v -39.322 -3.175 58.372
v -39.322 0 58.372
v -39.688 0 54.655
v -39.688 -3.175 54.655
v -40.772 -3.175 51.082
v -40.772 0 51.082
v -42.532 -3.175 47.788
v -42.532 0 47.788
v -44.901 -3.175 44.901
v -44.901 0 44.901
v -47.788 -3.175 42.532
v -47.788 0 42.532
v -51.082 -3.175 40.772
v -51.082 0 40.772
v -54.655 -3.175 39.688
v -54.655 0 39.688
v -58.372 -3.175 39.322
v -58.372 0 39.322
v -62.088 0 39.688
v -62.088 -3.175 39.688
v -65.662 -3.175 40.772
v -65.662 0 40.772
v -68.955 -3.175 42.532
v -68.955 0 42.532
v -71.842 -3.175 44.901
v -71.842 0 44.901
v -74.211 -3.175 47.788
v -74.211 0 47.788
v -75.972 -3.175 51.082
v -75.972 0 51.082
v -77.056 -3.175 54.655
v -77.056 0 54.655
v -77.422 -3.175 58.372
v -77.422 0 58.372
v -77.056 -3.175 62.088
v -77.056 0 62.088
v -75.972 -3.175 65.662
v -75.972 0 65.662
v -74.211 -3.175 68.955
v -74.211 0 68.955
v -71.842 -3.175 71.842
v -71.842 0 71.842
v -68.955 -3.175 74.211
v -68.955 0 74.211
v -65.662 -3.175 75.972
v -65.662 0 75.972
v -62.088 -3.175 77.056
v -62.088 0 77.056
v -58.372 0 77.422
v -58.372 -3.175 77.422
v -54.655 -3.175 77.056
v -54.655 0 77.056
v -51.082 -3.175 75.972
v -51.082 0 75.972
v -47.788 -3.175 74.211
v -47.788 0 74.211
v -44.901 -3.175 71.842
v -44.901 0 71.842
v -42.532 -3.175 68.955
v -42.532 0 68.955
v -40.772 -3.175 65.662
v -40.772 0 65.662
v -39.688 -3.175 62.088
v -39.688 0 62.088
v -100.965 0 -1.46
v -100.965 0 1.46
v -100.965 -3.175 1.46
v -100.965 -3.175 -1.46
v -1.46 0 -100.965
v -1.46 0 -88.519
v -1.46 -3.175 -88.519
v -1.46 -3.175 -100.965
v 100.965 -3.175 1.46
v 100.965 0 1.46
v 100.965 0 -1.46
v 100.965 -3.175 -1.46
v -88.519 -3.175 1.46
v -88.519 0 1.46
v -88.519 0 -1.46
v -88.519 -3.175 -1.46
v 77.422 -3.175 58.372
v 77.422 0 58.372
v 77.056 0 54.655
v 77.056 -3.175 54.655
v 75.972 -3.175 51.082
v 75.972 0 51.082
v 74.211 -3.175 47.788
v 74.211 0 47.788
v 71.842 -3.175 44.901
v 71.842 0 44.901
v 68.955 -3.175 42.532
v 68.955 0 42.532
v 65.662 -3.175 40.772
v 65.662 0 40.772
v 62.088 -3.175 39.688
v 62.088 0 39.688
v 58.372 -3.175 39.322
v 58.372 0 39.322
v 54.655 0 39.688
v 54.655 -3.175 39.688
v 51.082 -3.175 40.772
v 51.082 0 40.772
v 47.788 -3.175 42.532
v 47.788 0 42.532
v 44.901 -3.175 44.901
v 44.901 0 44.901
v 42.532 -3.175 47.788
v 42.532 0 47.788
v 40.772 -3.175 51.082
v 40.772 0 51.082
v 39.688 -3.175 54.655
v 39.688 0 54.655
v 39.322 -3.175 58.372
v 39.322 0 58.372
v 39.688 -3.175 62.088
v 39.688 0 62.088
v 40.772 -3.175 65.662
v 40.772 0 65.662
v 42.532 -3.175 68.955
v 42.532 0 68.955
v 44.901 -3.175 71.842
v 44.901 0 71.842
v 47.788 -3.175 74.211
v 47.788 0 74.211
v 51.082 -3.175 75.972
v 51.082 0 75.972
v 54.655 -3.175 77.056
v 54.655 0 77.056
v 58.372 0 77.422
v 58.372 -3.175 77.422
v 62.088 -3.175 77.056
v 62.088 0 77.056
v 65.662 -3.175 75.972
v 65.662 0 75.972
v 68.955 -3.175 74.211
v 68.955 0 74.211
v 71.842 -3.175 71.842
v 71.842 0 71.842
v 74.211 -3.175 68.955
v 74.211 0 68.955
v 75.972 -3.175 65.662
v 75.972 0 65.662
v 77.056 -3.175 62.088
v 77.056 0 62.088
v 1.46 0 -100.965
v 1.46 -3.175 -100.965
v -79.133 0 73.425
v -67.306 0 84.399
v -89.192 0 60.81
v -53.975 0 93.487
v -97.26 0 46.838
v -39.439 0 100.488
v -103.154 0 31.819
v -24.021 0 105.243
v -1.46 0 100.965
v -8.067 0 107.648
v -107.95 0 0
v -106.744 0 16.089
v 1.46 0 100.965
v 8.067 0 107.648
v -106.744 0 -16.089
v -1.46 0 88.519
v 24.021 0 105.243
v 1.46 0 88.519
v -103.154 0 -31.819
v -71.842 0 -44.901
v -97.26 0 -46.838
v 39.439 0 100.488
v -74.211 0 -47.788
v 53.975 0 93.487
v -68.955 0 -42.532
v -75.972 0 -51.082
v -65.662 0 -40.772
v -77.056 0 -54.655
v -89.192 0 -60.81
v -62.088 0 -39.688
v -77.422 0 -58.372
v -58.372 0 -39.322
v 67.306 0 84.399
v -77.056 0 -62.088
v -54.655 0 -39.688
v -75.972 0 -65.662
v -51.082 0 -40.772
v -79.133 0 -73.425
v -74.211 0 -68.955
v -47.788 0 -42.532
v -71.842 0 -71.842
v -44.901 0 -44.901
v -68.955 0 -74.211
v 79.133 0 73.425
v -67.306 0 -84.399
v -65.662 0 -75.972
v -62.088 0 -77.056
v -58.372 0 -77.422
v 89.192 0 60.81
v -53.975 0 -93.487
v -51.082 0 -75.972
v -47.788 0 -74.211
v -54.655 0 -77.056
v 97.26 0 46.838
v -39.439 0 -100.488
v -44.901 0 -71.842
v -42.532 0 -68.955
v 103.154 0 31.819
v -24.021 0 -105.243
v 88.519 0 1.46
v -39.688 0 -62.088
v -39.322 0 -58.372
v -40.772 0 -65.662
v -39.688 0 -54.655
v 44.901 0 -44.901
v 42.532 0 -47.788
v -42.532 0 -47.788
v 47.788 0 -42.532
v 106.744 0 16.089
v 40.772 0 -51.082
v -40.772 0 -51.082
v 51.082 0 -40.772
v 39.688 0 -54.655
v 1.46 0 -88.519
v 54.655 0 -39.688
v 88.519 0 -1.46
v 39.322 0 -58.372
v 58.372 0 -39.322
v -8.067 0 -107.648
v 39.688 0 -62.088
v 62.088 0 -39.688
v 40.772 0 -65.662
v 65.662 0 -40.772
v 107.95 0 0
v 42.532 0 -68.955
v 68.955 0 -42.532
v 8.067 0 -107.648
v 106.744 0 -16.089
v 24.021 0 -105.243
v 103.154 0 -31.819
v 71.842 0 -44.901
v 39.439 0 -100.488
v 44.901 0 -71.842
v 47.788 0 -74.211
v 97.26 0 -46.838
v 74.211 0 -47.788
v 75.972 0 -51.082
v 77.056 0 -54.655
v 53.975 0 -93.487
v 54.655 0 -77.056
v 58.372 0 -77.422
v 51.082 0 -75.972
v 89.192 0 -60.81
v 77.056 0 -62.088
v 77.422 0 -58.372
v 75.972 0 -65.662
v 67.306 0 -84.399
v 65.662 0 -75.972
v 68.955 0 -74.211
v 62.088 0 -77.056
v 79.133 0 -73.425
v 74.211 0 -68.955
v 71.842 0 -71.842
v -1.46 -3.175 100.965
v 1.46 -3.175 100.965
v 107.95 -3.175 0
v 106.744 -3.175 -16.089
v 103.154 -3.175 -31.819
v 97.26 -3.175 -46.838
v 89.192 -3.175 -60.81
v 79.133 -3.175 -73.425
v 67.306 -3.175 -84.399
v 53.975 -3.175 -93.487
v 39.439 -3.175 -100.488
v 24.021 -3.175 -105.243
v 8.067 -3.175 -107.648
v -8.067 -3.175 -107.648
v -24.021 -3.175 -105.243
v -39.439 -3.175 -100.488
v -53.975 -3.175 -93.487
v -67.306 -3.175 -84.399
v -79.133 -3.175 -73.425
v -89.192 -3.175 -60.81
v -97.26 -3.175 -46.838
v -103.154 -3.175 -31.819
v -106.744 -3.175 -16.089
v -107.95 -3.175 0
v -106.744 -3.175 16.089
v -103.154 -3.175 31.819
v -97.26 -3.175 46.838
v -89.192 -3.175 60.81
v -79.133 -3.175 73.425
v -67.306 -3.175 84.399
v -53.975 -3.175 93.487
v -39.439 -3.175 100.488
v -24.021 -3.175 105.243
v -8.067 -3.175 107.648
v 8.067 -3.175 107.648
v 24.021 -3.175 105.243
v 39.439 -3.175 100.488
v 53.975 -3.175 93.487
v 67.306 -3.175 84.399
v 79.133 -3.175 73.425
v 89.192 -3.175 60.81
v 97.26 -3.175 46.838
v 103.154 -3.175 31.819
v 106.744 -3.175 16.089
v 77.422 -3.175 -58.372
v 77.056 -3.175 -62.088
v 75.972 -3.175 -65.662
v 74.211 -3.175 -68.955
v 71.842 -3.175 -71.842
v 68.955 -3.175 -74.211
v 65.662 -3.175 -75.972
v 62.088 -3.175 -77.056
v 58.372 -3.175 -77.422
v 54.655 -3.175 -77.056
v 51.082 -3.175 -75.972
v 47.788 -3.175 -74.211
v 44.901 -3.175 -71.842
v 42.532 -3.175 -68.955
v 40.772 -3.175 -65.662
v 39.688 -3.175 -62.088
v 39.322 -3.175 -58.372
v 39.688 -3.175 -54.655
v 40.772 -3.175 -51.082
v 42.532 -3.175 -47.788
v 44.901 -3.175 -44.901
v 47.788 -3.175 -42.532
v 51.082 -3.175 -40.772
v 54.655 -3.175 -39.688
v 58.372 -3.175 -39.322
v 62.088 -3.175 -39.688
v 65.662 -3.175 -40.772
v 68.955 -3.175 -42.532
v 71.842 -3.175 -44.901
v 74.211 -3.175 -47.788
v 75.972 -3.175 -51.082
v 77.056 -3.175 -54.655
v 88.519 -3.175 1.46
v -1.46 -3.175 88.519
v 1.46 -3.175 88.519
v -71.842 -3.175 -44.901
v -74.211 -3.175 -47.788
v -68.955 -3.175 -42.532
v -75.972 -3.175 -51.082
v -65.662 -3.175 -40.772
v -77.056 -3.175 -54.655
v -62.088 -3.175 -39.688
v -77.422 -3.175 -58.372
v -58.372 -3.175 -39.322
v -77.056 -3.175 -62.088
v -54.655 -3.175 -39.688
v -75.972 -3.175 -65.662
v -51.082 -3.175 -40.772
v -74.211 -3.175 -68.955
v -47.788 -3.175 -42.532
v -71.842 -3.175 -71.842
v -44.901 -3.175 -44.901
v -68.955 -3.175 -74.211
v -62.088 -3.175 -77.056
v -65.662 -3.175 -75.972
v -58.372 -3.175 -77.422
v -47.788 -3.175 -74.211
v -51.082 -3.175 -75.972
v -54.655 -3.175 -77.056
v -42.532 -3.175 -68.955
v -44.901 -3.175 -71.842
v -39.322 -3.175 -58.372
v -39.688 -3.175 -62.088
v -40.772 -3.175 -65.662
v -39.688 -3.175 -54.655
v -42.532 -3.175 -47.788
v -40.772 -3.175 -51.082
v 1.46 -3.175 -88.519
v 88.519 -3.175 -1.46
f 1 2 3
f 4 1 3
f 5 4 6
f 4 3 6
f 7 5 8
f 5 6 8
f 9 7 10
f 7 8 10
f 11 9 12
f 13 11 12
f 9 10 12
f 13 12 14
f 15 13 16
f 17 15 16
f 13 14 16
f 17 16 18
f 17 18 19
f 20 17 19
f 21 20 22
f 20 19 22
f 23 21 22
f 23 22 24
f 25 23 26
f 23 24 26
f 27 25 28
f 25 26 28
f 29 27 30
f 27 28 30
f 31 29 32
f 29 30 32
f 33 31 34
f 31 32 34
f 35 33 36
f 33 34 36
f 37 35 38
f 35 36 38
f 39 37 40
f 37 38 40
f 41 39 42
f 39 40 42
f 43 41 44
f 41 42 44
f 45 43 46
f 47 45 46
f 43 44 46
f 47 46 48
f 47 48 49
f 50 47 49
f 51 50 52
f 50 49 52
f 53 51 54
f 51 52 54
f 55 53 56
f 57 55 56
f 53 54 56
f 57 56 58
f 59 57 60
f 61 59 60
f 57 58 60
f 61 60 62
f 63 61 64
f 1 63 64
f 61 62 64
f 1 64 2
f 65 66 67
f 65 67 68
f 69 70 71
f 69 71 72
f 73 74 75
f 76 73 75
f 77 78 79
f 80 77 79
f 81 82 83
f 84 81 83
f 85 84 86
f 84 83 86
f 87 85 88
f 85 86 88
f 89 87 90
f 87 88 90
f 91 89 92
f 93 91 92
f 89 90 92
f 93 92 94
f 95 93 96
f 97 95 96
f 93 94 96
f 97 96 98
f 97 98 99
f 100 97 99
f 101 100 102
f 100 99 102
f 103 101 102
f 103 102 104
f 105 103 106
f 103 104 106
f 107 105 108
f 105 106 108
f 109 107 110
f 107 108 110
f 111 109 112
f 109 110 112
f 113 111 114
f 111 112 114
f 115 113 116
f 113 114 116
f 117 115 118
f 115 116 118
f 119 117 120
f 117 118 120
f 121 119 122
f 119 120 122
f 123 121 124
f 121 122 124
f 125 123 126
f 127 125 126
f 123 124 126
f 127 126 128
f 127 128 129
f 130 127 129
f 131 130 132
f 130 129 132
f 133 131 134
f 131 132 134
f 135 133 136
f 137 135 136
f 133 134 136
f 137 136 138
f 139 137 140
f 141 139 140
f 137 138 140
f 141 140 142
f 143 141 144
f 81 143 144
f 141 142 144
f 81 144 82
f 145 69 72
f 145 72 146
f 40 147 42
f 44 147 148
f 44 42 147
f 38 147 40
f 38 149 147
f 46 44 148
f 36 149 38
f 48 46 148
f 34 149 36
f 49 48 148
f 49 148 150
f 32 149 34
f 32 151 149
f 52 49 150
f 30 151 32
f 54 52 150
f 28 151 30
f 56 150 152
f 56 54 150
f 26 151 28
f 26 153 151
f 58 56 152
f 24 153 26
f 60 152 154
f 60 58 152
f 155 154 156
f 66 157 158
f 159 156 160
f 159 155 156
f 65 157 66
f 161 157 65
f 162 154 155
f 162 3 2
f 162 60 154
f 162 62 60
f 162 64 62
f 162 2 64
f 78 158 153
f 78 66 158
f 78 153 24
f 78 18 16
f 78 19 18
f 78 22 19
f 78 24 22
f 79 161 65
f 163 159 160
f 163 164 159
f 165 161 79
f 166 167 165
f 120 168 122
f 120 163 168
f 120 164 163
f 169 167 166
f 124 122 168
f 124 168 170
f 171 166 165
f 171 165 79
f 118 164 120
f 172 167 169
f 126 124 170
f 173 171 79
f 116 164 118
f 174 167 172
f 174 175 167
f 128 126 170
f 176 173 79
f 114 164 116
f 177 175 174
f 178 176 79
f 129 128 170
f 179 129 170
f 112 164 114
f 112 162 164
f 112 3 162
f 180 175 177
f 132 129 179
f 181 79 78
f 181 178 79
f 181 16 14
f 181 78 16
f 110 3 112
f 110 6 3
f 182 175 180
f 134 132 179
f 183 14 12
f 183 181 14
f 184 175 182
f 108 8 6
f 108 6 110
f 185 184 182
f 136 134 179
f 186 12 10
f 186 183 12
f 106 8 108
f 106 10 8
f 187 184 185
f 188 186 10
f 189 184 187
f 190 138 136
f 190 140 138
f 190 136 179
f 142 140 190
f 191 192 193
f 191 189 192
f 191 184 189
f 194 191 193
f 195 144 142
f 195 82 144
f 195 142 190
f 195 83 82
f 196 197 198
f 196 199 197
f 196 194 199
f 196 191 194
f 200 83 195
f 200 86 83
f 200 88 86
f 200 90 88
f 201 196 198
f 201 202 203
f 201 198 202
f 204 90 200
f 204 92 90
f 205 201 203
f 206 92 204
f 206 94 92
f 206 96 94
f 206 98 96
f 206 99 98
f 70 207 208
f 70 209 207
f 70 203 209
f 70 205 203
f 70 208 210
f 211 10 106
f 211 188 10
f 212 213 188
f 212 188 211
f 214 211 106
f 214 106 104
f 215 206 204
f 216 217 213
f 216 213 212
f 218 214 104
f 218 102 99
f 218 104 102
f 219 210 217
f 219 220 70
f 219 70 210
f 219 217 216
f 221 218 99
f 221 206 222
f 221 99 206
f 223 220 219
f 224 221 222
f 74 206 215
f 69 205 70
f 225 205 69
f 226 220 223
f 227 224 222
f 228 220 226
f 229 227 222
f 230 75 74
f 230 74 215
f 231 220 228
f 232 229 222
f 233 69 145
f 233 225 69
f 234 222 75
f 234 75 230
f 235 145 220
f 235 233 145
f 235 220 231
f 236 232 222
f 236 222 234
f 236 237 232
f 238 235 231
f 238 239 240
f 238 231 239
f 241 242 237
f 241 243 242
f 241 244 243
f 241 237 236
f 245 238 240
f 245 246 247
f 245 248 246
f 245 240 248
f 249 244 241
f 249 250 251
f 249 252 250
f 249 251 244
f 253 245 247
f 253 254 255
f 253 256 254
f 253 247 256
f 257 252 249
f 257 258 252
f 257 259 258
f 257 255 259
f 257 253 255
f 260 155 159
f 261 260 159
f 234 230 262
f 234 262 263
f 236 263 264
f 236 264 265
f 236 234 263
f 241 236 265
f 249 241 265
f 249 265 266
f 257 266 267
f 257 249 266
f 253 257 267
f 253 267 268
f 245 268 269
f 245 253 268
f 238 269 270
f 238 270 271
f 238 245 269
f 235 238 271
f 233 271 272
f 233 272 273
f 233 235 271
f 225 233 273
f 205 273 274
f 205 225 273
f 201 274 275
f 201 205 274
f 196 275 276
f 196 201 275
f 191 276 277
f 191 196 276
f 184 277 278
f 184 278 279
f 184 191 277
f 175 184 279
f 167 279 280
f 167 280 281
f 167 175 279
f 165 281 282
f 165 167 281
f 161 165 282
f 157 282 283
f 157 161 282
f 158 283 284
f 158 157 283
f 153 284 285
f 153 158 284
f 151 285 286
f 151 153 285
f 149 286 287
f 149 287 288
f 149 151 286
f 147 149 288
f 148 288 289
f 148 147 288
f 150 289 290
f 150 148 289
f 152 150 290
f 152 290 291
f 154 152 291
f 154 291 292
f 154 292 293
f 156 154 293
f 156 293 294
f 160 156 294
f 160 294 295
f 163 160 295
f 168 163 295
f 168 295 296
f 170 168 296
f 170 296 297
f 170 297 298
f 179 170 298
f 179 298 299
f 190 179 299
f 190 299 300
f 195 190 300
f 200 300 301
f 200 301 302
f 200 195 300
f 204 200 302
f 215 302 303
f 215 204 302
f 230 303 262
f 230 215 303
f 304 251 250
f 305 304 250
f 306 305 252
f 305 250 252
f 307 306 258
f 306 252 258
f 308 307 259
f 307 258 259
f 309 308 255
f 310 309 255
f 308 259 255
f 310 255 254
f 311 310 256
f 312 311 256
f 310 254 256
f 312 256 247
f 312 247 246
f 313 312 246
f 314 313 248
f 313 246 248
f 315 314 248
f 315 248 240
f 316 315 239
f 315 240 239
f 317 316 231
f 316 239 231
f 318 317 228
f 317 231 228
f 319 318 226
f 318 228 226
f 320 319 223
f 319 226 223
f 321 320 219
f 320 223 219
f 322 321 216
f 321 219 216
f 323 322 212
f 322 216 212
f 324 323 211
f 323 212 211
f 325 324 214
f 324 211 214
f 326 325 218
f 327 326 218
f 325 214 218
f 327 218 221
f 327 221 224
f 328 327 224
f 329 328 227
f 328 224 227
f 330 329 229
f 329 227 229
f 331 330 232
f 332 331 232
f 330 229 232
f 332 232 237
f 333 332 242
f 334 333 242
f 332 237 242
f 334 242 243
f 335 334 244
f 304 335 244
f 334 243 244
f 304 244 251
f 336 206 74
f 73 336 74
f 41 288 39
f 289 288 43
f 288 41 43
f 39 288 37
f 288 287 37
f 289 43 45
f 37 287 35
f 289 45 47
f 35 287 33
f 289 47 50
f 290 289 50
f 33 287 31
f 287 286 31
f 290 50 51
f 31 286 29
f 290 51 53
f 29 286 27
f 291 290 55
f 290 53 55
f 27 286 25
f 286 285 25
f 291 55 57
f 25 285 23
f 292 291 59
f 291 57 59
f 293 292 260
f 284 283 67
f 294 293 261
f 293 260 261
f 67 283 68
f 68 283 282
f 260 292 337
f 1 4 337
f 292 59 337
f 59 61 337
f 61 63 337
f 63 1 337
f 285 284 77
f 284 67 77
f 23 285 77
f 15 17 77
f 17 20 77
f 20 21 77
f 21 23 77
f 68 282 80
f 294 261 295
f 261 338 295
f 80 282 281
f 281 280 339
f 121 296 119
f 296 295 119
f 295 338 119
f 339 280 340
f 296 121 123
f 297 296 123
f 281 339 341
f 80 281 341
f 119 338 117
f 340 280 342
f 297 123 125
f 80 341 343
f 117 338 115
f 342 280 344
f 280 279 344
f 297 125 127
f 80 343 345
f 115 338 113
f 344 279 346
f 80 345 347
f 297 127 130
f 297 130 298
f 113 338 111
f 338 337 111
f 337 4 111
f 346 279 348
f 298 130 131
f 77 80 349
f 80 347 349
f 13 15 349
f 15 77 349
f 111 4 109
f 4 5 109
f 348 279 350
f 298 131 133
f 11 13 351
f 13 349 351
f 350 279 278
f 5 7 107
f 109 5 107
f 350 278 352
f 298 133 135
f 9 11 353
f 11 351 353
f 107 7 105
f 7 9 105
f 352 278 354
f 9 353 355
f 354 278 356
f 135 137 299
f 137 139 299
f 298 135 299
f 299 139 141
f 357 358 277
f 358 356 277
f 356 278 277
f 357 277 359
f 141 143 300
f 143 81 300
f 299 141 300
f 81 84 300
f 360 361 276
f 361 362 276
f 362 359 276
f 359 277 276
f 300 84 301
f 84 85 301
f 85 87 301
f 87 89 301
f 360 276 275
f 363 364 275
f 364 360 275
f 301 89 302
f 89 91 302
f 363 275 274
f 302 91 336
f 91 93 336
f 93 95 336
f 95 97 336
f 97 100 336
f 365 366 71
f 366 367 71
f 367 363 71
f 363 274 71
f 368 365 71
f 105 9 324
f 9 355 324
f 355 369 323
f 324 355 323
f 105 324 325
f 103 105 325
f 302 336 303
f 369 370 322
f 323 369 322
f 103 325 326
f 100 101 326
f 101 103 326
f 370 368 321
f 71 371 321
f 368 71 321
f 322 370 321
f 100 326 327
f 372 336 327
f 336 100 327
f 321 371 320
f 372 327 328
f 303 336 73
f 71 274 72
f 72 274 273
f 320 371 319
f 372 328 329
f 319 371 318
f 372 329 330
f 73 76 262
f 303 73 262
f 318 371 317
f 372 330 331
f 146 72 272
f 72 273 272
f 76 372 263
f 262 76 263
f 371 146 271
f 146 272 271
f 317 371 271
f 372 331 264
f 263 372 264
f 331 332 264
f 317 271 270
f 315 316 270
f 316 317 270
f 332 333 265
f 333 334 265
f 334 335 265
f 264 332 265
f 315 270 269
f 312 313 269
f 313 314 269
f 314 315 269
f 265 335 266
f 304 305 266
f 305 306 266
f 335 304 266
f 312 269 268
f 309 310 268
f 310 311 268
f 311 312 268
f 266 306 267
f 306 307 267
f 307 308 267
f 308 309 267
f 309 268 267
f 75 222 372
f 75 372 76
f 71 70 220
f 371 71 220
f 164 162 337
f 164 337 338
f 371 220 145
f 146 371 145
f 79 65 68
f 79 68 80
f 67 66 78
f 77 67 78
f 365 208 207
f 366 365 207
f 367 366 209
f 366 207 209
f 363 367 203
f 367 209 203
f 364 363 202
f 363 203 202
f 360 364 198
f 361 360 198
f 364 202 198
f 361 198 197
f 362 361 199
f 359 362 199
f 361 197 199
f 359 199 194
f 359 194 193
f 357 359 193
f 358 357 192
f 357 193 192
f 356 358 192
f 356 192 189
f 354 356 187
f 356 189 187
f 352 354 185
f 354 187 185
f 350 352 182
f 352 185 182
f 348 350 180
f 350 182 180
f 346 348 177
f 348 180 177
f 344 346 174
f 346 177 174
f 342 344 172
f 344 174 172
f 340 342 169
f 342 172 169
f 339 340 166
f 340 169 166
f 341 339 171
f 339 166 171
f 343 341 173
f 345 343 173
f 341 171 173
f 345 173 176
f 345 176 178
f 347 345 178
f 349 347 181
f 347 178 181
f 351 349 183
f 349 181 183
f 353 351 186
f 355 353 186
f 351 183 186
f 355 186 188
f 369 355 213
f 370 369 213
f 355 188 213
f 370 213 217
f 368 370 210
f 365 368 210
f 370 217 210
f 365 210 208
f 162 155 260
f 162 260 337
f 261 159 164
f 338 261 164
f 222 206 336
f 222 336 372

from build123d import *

# Parameters (mm, degrees)
SKETCH1_R           = 107.95
SKETCH1_R_2         = 19.05
SKETCH1_W           = 2.921
SKETCH1_H           = 12.446
SKETCH1_W_2         = 12.446
SKETCH1_H_2         = 2.921
BOSS_EXTRUDE1_DEPTH = 3.175


with BuildPart() as part:
    # Sketch1 → Boss-Extrude1 (new body)
    with BuildSketch(Plane(origin=(0, 0, 0), x_dir=(1, 0, 0), z_dir=(0, 1, 0))):
        Circle(SKETCH1_R)
        with Locations((58.371664787, 58.371664787)):
            Circle(SKETCH1_R_2, mode=Mode.SUBTRACT)
        with Locations((58.371664787, -58.371664787)):
            Circle(SKETCH1_R_2, mode=Mode.SUBTRACT)
        with Locations((-58.371664787, -58.371664787)):
            Circle(SKETCH1_R_2, mode=Mode.SUBTRACT)
        with Locations((-58.371664787, 58.371664787)):
            Circle(SKETCH1_R_2, mode=Mode.SUBTRACT)
        with Locations((0, -94.742)):
            Rectangle(SKETCH1_W, SKETCH1_H, mode=Mode.SUBTRACT)
        with Locations((94.742, 0)):
            Rectangle(SKETCH1_W_2, SKETCH1_H_2, mode=Mode.SUBTRACT)
        with Locations((-94.742, 0)):
            Rectangle(SKETCH1_W_2, SKETCH1_H_2, mode=Mode.SUBTRACT)
        with Locations((0, 94.742)):
            Rectangle(SKETCH1_W, SKETCH1_H, mode=Mode.SUBTRACT)
    extrude(amount=-BOSS_EXTRUDE1_DEPTH)


solid = part.part
